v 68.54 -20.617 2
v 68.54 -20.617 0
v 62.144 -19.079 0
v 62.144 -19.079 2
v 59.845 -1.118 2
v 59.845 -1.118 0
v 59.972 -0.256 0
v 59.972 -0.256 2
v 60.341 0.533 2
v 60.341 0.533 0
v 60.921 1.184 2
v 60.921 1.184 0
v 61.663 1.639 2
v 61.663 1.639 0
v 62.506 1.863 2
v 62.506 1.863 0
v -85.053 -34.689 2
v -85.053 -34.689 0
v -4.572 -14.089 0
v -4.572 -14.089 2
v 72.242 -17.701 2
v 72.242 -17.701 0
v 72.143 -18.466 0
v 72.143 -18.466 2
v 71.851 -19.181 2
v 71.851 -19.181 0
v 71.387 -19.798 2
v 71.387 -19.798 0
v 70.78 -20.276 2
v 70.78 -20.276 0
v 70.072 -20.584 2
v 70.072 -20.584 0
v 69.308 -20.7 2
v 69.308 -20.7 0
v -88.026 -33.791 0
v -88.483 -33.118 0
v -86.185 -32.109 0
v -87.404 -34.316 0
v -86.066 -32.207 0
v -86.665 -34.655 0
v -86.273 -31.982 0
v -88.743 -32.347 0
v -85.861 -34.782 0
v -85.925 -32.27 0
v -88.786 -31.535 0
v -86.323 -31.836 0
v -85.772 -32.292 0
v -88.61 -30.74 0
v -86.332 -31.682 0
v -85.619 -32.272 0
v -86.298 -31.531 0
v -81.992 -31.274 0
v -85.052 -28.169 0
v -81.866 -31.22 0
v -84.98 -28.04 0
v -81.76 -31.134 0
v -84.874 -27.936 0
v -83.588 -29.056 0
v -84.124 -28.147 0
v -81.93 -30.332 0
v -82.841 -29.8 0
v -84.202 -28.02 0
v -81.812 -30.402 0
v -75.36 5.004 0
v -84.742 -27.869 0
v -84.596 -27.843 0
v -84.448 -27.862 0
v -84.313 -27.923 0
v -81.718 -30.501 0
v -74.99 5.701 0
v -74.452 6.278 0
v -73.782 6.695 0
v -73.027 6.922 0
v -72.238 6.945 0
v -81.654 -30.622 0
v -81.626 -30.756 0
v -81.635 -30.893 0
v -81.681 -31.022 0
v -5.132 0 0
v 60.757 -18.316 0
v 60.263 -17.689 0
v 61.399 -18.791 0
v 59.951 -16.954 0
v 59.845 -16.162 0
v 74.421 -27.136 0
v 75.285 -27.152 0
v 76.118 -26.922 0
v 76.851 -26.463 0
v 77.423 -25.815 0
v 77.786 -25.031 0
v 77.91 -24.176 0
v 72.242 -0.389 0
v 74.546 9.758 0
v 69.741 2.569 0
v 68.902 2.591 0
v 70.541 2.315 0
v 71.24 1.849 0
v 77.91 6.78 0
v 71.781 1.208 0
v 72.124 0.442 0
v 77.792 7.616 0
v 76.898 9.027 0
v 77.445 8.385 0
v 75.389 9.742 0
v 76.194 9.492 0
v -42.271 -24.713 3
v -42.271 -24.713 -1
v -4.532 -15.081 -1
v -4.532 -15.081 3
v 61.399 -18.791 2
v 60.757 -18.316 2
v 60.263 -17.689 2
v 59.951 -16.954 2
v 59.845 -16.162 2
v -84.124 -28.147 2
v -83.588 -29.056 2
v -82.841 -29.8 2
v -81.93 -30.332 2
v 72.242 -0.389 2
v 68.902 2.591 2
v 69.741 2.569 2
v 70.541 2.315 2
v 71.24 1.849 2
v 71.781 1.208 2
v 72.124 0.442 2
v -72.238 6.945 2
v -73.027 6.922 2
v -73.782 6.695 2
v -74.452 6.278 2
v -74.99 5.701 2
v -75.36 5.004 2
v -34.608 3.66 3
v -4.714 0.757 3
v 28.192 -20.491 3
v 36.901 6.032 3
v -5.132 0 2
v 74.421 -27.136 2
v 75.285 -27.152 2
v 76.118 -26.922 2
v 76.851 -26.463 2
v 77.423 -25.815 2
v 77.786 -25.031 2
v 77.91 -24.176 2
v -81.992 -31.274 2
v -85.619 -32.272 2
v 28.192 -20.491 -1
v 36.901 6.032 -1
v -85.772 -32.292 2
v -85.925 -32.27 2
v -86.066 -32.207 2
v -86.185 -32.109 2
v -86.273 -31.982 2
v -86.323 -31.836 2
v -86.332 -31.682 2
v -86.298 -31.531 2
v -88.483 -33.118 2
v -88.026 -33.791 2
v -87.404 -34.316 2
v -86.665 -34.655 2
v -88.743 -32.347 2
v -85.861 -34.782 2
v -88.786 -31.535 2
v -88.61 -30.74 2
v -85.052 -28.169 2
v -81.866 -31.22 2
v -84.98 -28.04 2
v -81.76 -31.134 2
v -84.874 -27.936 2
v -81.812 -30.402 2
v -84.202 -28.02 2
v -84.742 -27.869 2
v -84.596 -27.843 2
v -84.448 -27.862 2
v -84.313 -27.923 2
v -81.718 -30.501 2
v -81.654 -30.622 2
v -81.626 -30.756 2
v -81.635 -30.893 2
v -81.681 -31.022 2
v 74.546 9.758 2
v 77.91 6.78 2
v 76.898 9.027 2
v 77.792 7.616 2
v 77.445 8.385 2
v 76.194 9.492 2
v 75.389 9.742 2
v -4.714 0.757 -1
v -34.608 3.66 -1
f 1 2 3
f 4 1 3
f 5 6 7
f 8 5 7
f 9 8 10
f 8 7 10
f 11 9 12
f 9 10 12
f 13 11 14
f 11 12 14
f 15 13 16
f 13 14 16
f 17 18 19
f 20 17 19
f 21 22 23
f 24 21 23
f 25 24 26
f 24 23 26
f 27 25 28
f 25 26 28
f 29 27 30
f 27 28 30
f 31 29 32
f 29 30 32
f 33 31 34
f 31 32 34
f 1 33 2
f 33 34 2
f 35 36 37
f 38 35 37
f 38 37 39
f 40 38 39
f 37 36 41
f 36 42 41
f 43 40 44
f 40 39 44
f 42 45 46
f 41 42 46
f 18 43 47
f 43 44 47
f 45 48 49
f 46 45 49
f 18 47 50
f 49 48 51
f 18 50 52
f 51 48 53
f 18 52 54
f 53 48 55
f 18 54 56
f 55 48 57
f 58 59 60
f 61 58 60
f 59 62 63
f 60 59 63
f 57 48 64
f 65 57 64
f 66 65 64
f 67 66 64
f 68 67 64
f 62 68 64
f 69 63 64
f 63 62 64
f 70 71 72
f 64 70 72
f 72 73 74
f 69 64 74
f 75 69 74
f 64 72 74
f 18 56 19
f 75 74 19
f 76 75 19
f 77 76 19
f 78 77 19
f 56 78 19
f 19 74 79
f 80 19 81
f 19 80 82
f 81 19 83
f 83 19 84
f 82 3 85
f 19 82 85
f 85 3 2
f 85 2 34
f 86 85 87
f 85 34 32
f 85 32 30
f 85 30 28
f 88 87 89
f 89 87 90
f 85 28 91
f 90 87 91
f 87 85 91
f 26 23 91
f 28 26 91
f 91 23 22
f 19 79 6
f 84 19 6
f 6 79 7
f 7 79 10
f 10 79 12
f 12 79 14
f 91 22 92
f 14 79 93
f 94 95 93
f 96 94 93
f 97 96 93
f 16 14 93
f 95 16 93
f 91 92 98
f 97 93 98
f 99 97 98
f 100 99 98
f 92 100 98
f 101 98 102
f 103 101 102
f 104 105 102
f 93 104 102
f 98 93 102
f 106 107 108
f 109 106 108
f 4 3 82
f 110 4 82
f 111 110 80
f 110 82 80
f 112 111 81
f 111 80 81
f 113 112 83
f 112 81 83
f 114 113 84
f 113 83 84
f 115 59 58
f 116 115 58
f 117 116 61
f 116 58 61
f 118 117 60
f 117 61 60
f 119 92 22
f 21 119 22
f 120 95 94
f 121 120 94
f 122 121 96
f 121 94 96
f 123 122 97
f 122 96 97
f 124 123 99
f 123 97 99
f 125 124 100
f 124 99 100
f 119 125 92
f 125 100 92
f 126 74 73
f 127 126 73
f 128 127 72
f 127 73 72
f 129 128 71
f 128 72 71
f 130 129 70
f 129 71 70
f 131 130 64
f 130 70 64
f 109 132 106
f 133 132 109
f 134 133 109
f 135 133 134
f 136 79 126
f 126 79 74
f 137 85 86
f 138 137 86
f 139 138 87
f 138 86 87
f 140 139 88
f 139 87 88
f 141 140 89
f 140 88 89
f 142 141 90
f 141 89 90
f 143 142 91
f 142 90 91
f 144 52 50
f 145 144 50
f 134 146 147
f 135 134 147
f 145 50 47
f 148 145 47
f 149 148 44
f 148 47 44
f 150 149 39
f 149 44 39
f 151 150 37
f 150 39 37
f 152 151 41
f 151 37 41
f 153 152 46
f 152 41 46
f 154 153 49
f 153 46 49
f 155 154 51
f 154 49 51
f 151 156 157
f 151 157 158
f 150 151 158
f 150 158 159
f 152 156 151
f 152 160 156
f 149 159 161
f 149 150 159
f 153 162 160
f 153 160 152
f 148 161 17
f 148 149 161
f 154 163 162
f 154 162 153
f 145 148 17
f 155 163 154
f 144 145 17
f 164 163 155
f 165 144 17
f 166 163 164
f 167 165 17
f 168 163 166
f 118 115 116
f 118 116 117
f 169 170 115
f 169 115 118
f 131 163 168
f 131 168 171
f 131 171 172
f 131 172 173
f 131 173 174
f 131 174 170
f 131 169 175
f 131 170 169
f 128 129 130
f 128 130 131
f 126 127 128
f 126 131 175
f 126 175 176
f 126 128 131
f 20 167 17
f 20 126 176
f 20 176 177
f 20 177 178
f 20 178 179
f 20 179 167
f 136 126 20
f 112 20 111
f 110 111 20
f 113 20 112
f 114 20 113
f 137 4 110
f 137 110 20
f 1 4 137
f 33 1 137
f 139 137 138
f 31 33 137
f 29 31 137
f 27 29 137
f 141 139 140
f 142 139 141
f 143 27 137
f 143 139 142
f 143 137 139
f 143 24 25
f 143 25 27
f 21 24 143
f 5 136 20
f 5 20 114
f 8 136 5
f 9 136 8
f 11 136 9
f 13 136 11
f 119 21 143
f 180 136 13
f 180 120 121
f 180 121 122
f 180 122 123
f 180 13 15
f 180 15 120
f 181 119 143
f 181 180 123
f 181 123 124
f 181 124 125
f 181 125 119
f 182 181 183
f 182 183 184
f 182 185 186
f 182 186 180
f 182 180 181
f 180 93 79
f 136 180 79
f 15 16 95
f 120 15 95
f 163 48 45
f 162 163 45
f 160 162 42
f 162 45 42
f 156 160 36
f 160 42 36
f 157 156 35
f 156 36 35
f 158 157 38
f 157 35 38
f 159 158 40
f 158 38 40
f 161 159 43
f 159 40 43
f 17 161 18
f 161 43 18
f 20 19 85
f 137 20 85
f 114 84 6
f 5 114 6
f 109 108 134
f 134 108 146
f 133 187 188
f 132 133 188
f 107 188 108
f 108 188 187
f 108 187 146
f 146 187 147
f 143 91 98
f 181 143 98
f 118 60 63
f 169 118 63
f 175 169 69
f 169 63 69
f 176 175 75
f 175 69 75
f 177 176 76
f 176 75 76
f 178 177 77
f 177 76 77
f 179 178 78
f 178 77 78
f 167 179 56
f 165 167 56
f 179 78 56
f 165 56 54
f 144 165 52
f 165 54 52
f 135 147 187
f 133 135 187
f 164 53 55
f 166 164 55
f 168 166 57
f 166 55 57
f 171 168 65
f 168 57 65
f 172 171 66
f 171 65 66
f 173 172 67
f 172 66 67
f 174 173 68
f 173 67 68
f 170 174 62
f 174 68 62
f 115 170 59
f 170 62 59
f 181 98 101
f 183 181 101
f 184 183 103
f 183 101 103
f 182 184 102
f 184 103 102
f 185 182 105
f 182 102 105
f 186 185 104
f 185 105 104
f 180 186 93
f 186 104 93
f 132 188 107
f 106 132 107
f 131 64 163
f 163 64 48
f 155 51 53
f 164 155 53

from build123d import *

# Parameters (mm, degrees)
F1_DEPTH = 2
F4_DEPTH = 4


with BuildPart() as f1:
    # F0 (on Top) → F1 (new body)
    with BuildSketch(Plane.XY):
        with BuildLine():
            ThreePointArc((-88.609635, -30.740412), (-88.025797, -33.790892), (-85.052769, -34.689448))
            Line((-85.052769, -34.689448), (-4.571978, -14.08916))
            Line((-4.571978, -14.08916), (74.421399, -27.135575))
            ThreePointArc((74.421399, -27.135575), (76.851056, -26.463309), (77.910252, -24.175673))
            Line((77.910252, -24.175673), (77.910252, 6.780489))
            ThreePointArc((77.910252, 6.780489), (76.898458, 9.02705), (74.545561, 9.75824))
            Line((74.545561, 9.75824), (-5.131812, 0))
            Line((-5.131812, 0), (-72.237842, 6.945113))
            ThreePointArc((-72.237842, 6.945113), (-74.130924, 6.508631), (-75.35963, 5.003785))
            Line((-75.35963, 5.003785), (-88.609635, -30.740412))
        make_face()
        with BuildLine():
            ThreePointArc((-85.619408, -32.271752), (-86.185087, -32.108984), (-86.298307, -31.531344))
            Line((-86.298307, -31.531344), (-85.052094, -28.169468))
            ThreePointArc((-85.052094, -28.169468), (-84.59562, -27.843409), (-84.123599, -28.146525))
            ThreePointArc((-84.123599, -28.146525), (-83.238457, -29.451769), (-81.929654, -30.33164))
            ThreePointArc((-81.929654, -30.33164), (-81.625618, -30.825075), (-81.991952, -31.274202))
            Line((-81.991952, -31.274202), (-85.619408, -32.271752))
        make_face(mode=Mode.SUBTRACT)
        with BuildLine():
            Line((72.241887, -0.38926), (72.241887, -17.70067))
            ThreePointArc((72.241887, -17.70067), (71.098693, -20.056996), (68.540372, -20.617497))
            Line((68.540372, -20.617497), (62.14362, -19.079038))
            ThreePointArc((62.14362, -19.079038), (60.488809, -18.019017), (59.845135, -16.162211))
            Line((59.845135, -16.162211), (59.845135, -1.118004))
            ThreePointArc((59.845135, -1.118004), (60.606974, 0.879654), (62.505559, 1.862716))
            Line((62.505559, 1.862716), (68.902312, 2.591459))
            ThreePointArc((68.902312, 2.591459), (71.239545, 1.848901), (72.241887, -0.38926))
        make_face(mode=Mode.SUBTRACT)
    extrude(amount=F1_DEPTH)


with BuildPart() as f4:
    # F3 (on offset) → F4 (new body)
    with BuildSketch(Plane.XY.offset(-1)):
        Polygon((-34.607757, 3.660409), (-42.271342, -24.713343), (-4.532447, -15.080688), (28.192187, -20.490808), (36.901165, 6.03198), (-4.714334, 0.757373), align=None)
    extrude(amount=F4_DEPTH)


solid = Compound([f1.part, f4.part])
